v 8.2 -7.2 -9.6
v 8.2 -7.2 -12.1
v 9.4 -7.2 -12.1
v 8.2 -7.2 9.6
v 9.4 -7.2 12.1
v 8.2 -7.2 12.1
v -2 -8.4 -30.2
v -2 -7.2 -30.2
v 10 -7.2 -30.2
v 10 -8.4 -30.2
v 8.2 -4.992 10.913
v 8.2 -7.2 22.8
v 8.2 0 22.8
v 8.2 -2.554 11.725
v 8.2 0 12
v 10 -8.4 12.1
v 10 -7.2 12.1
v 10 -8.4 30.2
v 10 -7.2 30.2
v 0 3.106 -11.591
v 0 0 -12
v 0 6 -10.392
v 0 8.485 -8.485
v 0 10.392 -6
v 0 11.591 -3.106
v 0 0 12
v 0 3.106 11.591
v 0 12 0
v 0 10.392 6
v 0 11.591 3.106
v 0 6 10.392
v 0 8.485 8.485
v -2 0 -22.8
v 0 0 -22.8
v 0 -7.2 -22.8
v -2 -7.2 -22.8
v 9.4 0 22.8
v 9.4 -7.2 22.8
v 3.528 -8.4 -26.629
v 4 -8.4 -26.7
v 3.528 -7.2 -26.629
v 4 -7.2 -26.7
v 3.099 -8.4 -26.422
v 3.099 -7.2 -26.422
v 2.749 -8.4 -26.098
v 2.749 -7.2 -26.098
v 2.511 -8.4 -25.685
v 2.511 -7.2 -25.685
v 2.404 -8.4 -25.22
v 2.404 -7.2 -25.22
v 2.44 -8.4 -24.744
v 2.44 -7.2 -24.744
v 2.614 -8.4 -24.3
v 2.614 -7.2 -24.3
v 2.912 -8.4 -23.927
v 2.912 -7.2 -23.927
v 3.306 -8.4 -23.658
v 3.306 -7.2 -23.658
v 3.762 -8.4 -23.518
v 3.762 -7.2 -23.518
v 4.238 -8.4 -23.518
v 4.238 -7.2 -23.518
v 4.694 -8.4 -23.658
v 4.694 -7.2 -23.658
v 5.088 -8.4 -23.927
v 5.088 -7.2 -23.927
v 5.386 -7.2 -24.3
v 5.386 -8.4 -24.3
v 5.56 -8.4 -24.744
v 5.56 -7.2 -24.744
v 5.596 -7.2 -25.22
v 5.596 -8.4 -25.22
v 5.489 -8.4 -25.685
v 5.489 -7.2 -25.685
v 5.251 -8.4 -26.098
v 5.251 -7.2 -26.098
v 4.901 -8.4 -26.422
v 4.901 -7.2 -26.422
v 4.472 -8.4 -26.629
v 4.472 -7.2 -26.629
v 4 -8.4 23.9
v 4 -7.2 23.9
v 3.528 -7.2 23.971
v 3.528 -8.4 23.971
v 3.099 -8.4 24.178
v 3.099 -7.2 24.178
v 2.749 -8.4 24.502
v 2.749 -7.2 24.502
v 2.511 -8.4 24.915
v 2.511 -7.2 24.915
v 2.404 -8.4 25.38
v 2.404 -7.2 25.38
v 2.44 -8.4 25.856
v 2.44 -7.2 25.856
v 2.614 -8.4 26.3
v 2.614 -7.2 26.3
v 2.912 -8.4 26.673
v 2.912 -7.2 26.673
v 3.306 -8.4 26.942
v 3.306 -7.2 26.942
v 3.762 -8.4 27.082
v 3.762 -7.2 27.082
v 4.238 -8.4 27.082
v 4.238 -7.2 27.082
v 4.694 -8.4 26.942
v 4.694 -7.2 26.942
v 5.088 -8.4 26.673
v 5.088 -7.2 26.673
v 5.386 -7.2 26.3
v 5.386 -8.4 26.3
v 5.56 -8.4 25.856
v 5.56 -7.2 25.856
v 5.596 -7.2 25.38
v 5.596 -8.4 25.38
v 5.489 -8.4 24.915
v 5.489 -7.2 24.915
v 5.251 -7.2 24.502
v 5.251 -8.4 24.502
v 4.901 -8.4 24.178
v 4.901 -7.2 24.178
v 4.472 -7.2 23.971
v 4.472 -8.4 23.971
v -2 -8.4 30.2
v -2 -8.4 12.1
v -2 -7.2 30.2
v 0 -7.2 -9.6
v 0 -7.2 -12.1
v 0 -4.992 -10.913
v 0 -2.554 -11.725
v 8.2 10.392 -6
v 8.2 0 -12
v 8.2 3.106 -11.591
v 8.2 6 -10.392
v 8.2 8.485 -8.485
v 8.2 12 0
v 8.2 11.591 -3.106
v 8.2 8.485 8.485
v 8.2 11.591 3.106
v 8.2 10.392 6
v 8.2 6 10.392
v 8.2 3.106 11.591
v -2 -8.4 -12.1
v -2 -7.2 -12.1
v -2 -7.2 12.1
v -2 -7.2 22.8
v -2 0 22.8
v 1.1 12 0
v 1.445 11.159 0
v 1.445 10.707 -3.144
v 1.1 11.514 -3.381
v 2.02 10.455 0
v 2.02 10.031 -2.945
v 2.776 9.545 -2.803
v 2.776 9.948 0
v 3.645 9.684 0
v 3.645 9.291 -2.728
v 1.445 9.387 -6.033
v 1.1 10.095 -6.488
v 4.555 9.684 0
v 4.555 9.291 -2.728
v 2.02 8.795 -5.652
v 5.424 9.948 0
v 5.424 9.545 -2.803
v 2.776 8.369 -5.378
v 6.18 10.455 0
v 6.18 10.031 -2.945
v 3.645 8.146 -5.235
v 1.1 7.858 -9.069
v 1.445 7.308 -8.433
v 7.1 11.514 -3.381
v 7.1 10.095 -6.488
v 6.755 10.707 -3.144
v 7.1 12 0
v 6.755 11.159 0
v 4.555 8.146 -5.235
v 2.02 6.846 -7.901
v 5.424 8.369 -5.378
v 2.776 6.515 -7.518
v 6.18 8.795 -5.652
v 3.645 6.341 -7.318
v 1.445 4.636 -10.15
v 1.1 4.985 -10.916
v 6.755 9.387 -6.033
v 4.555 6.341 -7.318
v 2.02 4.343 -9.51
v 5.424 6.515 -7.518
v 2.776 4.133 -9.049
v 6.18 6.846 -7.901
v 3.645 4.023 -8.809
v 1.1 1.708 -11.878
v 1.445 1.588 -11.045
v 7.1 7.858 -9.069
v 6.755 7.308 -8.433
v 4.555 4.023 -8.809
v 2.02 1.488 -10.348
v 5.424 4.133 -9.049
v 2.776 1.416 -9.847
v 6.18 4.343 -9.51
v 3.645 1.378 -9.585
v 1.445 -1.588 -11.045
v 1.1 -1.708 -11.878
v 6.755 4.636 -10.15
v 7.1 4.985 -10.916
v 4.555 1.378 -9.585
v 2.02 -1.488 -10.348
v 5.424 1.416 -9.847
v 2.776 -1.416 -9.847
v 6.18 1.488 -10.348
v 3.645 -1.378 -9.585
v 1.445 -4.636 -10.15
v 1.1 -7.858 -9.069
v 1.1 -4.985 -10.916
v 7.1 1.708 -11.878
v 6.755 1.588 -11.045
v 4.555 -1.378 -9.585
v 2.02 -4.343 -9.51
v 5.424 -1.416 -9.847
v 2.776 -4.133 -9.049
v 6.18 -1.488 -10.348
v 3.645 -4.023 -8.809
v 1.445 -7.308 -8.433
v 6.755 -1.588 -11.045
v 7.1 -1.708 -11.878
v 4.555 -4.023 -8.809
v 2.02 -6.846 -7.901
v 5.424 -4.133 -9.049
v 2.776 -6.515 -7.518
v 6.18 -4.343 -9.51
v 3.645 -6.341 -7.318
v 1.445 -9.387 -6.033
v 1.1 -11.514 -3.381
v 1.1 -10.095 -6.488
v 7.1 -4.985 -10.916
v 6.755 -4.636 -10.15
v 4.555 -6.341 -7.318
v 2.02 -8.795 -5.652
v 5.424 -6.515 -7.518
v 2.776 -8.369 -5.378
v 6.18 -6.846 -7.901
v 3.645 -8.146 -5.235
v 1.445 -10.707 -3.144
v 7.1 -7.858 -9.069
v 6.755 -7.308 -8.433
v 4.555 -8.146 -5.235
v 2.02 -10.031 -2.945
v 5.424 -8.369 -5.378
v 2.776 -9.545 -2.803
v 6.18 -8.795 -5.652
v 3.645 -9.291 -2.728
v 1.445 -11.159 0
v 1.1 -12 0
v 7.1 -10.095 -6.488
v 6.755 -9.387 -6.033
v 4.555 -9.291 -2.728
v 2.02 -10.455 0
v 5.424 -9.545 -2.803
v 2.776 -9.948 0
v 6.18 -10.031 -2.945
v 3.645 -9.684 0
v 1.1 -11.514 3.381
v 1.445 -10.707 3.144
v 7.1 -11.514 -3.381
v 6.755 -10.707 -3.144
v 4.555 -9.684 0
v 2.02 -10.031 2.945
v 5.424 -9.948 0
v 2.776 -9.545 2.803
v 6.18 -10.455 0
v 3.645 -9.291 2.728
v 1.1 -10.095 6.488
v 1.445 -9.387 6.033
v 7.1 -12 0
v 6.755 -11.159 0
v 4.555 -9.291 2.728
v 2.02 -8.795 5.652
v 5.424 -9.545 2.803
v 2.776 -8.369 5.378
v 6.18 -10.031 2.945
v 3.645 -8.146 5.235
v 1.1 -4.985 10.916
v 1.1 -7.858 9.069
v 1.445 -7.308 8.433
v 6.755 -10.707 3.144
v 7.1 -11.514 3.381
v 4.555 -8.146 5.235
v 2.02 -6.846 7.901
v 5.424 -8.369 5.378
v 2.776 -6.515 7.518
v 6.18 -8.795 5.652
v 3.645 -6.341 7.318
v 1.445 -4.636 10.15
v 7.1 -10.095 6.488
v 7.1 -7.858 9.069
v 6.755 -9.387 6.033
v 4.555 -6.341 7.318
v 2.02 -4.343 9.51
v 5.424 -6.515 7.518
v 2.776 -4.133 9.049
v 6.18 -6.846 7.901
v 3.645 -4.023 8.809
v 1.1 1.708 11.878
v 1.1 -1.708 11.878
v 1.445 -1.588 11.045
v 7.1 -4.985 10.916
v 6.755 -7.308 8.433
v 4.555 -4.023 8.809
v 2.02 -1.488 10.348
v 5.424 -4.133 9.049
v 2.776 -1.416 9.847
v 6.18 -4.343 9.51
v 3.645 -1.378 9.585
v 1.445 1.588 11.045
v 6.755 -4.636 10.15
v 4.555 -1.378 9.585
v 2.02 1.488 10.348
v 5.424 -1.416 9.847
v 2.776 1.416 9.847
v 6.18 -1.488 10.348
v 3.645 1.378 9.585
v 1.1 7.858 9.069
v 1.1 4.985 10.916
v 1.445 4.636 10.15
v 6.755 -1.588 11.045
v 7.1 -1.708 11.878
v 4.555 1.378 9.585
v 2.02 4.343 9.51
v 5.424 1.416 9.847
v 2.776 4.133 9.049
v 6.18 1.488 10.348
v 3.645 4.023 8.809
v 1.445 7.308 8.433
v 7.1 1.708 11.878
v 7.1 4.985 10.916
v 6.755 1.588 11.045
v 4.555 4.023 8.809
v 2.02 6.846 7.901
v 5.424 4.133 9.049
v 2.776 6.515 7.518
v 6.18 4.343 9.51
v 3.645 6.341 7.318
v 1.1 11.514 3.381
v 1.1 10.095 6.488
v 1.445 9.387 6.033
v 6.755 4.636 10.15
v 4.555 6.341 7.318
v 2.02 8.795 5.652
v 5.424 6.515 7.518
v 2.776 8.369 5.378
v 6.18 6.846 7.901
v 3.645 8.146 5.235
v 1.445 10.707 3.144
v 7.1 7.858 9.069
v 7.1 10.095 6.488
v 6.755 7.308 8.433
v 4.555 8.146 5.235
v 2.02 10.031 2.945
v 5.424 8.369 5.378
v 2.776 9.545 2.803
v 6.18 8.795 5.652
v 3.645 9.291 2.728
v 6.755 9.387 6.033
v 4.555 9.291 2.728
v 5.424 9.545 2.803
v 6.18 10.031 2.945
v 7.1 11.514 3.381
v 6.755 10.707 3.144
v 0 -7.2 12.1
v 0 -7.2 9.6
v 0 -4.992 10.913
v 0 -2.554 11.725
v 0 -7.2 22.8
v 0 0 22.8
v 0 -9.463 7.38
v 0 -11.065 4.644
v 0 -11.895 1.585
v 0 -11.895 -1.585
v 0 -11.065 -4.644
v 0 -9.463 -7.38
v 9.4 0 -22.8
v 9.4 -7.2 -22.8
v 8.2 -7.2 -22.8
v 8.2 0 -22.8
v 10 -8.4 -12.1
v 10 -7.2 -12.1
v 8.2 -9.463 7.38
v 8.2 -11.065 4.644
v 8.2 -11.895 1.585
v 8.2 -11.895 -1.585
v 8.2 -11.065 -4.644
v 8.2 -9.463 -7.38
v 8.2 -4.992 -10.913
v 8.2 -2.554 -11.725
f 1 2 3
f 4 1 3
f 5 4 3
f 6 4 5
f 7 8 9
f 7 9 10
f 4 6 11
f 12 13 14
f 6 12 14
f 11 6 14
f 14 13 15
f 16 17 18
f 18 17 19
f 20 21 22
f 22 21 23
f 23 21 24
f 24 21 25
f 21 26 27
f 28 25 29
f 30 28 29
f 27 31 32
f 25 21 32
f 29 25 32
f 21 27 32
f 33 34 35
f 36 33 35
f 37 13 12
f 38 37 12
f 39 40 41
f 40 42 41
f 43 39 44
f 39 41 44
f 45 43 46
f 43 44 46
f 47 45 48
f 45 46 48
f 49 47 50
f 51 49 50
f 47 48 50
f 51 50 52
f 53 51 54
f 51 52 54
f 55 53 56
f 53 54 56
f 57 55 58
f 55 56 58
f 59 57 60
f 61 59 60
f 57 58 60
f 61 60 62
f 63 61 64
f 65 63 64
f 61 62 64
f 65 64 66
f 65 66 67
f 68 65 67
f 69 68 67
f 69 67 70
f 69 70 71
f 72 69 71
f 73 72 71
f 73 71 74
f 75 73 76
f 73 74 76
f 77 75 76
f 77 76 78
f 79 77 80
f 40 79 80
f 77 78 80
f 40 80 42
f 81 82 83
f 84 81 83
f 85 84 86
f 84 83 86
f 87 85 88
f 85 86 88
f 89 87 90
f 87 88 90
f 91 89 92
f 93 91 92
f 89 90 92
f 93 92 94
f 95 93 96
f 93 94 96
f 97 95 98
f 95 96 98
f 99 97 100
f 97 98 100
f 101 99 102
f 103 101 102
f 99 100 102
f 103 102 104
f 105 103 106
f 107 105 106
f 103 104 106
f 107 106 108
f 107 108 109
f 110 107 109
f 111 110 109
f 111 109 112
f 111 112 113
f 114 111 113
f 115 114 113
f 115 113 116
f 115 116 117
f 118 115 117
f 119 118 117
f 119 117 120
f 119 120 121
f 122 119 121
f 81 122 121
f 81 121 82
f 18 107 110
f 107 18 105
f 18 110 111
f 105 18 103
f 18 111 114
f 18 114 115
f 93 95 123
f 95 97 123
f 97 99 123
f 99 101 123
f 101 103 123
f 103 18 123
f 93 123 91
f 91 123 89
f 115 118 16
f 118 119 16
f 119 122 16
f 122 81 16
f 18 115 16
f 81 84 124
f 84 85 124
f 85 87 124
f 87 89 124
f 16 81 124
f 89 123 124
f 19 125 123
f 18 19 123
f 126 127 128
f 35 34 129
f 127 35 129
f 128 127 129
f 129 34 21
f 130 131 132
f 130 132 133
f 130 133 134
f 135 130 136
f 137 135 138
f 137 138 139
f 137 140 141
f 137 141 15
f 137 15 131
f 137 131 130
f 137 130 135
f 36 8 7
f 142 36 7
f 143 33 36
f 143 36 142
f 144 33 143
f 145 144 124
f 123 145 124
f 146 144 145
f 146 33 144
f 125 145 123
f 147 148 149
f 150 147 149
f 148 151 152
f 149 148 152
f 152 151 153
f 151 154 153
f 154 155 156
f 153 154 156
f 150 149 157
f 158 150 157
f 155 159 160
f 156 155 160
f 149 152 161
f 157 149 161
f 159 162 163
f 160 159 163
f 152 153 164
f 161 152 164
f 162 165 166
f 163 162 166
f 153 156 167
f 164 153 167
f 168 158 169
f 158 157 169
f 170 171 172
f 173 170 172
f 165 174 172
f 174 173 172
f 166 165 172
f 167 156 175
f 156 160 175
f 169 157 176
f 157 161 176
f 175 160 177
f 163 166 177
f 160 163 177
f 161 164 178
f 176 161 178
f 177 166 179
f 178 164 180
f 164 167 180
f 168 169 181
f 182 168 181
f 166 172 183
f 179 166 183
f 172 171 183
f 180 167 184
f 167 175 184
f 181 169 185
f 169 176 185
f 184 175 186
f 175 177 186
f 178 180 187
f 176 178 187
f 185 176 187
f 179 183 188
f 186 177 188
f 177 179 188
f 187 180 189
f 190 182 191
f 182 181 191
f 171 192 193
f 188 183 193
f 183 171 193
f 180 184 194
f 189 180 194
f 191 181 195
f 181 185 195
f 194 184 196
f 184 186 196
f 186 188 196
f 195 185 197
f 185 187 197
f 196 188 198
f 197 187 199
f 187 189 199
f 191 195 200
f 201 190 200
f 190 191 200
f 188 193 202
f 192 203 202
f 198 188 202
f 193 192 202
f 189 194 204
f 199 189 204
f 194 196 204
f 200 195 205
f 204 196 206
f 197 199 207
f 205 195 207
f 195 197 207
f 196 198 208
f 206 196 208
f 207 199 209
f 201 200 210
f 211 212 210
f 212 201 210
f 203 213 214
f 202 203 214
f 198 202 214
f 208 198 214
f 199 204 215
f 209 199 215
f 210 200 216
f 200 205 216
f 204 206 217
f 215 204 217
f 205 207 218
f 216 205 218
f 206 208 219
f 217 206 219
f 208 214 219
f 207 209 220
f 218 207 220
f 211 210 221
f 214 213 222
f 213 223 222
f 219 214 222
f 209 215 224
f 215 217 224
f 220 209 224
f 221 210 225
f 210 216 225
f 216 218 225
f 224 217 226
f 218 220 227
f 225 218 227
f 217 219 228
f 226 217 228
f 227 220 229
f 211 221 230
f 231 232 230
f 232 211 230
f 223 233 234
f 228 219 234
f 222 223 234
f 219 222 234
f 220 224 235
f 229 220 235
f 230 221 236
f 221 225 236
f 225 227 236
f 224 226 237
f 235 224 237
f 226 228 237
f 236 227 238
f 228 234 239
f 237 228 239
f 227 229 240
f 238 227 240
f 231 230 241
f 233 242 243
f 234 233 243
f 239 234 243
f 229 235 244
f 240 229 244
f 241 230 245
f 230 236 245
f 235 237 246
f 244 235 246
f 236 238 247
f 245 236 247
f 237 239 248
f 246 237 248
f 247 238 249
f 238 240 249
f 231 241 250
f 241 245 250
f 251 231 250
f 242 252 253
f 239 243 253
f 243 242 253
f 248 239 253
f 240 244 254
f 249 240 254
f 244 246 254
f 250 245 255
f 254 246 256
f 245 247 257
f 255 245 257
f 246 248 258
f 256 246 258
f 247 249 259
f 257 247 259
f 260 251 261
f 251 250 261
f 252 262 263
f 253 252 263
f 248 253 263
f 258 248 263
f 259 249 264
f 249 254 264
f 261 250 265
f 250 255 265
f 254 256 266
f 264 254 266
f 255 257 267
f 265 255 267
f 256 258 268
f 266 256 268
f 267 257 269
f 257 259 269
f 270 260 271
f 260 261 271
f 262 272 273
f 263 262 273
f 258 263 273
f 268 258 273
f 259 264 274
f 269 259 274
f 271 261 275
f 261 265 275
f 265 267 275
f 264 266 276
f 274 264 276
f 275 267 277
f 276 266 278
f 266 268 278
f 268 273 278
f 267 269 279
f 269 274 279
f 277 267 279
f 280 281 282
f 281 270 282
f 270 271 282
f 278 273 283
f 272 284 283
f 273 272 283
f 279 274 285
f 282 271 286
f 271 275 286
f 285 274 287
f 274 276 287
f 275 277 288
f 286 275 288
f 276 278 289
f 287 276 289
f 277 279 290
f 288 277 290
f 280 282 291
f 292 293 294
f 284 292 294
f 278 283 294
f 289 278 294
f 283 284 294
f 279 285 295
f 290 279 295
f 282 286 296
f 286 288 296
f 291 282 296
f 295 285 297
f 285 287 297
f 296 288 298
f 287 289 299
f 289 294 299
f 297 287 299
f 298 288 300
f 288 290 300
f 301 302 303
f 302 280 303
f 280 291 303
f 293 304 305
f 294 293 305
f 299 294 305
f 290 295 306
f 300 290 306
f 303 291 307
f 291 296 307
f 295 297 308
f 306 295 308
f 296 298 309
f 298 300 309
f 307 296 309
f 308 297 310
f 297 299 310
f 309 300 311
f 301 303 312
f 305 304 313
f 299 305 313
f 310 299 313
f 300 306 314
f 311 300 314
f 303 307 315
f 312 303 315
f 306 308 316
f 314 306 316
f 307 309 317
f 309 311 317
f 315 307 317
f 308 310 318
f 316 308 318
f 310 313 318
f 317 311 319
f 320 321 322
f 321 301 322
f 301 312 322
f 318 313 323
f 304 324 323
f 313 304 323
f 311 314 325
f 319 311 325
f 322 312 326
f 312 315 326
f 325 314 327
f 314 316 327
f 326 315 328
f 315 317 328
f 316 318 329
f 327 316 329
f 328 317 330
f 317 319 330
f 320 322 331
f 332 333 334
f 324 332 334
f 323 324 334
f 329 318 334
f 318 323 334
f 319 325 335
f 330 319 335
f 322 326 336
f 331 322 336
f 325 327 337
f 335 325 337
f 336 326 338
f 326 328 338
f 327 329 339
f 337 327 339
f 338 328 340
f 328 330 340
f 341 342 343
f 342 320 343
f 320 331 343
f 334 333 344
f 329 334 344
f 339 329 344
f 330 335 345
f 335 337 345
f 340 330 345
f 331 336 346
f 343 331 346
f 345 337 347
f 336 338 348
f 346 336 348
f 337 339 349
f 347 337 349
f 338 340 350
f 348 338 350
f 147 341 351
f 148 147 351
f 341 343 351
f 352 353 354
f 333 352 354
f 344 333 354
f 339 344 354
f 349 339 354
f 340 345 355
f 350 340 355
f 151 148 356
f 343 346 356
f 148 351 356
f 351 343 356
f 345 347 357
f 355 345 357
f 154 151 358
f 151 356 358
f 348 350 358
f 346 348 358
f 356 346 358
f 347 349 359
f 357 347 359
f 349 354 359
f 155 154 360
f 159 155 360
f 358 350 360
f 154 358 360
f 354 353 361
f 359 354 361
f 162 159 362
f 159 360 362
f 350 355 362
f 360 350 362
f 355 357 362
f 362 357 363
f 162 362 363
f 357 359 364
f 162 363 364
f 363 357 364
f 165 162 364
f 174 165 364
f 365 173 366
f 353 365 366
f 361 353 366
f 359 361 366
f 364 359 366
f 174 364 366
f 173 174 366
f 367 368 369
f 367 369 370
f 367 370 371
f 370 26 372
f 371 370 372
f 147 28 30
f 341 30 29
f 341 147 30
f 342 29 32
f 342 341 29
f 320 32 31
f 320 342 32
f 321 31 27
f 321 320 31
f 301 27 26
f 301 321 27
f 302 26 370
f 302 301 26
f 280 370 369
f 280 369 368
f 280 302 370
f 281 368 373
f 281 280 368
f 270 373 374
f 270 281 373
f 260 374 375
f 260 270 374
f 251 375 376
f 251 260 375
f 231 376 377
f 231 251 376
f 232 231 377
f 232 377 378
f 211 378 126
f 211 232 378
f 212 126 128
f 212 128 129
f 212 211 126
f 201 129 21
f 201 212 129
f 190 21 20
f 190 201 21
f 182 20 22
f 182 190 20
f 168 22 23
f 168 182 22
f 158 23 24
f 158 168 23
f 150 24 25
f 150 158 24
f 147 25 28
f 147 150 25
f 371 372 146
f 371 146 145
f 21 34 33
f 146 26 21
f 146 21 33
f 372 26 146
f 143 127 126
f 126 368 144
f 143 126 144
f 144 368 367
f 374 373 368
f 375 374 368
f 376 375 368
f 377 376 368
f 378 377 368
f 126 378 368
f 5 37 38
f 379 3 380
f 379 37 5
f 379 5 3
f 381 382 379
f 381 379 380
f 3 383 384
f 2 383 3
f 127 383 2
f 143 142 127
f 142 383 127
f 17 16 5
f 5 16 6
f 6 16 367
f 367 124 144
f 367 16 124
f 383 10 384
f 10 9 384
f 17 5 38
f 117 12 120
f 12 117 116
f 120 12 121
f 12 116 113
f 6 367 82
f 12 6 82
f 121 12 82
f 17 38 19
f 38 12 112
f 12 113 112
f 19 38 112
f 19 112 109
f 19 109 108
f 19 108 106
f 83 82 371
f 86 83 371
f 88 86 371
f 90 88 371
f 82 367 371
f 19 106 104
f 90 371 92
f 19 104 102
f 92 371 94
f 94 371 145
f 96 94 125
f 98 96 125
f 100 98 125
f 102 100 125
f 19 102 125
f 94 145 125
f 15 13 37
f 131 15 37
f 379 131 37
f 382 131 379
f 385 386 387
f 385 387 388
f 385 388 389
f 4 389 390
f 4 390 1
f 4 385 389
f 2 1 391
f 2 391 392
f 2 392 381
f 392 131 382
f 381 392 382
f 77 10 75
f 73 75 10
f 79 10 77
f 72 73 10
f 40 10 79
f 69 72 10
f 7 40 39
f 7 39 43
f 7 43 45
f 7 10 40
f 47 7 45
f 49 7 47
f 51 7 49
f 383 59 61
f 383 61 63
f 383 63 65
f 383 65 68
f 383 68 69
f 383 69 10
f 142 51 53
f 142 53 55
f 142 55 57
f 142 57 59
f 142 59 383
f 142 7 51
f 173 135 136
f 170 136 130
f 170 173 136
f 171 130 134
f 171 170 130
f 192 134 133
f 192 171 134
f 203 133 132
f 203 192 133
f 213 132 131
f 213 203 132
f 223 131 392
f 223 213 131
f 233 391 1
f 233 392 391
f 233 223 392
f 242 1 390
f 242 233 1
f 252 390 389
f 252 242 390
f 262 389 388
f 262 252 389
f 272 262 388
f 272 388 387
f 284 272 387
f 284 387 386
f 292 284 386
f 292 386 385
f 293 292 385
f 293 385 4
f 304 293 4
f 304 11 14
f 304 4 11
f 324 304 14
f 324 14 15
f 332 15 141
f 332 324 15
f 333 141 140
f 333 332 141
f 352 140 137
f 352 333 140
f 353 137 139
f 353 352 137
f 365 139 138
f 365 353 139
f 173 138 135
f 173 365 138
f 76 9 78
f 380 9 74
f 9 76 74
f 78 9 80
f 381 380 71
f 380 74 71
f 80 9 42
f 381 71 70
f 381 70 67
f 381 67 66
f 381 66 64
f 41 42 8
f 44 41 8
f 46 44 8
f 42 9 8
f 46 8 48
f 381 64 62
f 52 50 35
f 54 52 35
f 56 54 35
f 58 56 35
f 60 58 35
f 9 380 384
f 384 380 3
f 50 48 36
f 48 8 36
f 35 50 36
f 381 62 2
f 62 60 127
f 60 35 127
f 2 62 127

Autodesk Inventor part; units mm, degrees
ref_plane "YZ Plane" through (0, 0, 0) normal (1, 0, 0) x (0, 1, 0)
ref_plane "XZ Plane" through (0, 0, 0) normal (0, 1, 0) x (-1, 0, 0)
ref_plane "XY Plane" through (0, 0, 0) normal (0, 0, 1) x (1, 0, 0)
sketch "スケッチ1" plane through (0, 0, 0) normal (0, 0, 1) x (1, 0, 0)
  line L0 (0, 0) -> (8.2, 0)
  line L1 (8.2, 0) -> (4.1, 0)
  line L2 (0, 0) -> (0, 12)
  line L3 (8.2, 0) -> (8.2, 12)
  line L4 (4.1, 0) -> (4.1, 9.65)
  line L5 (0, 12) -> (1.1, 12)
  line L6 (8.2, 12) -> (7.1, 12)
  arc A0 (1.1, 12) -> (7.1, 12) centre (4.1, 12.7399) ccw
  dimension "d0" = 8.2
  dimension "d1" = 12
  dimension "d2" = 12
  dimension "d3" = 9.65
  dimension "d4" = 1.1
  dimension "d5" = 1.1
revolve "回転1" add sketch "スケッチ1" angle 360 about axis through (0, 0, 0) along (1, 0, 0)
sketch "スケッチ2" plane through (8.2, 0, 0) normal (1, 0, 0) x (0, 0, -1)
  circle A0 centre (0, 0) radius 12 projected
  line L0 (0, 0) -> (22.8, 0)
  line L1 (0, 0) -> (0, -7.2)
  line L2 (0, 0) -> (22.8, 0)
  line L3 (22.8, 0) -> (22.8, -7.2)
  line L4 (22.8, -7.2) -> (0, -7.2)
  line L5 (0, -7.2) -> (0, 0)
  line L6 (0, 0) -> (-22.8, 0)
  line L7 (-22.8, 0) -> (-22.8, -7.2)
  line L8 (-22.8, -7.2) -> (0, -7.2)
  dimension "d7" = 22.8
  dimension "d8" = 7.2
  dimension "d17" = 0
extrude "押し出し1" add sketch "スケッチ2" along normal blind 1.2 contours L0 L3 L4 A0 | A0 L4 L1 L0 | L6 L1 L8 A0 | A0 L8 L7 L6
sketch "スケッチ3" plane through (0, 0, 0) normal (-1, 0, 0) x (0, 0, 1)
  circle A0 centre (0, 0) radius 12 projected
  line L0 (0, 0) -> (0, -7.2)
  line L1 (0, -7.2) -> (22.8, -7.2)
  line L2 (0, 0) -> (22.8, 0)
  line L3 (22.8, 0) -> (22.8, -7.2)
  line L4 (22.8, -7.2) -> (0, -7.2)
  line L5 (0, -7.2) -> (0, 0)
  line L6 (0, 0) -> (-22.8, 0)
  line L7 (-22.8, 0) -> (-22.8, -7.2)
  line L8 (-22.8, -7.2) -> (0, -7.2)
  dimension "d11" = 7.2
  dimension "d12" = 22.8
extrude "押し出し2" add sketch "スケッチ3" along normal blind 2 contours L2 L3 L1 A0 | A0 L1 L0 L2 | L6 L0 L8 A0 | A0 L8 L7 L6
sketch "スケッチ4" plane through (-2, 0, 0) normal (-1, 0, 0) x (0, 0, 1)
  line L0 (-22.8, -7.2) -> (22.8, -7.2) projected
  line L1 (0, -7.2) -> (12.1, -7.2)
  line L2 (12.1, -7.2) -> (30.2, -7.2)
  line L3 (12.1, -7.2) -> (30.2, -7.2)
  line L4 (30.2, -7.2) -> (30.2, -8.4)
  line L5 (30.2, -8.4) -> (12.1, -8.4)
  line L6 (12.1, -8.4) -> (12.1, -7.2)
  line L7 (0, 0) -> (0, -1.8874)
  line L8 (-12.1, -7.2) -> (-30.2, -7.2)
  line L9 (-30.2, -7.2) -> (-30.2, -8.4)
  line L10 (-30.2, -8.4) -> (-12.1, -8.4)
  line L11 (-12.1, -8.4) -> (-12.1, -7.2)
  dimension "d15" = 12.1
  dimension "d16" = 18.1
  dimension "d18" = 1.2
extrude "押し出し3" add sketch "スケッチ4" against normal blind 12
sketch "スケッチ5" plane through (-2, -8.4, 12.1) normal (0, -1, 0) x (1, 0, 0)
  line L0 (0, 18.1) -> (12, 18.1) projected
  line L1 (6, 18.1) -> (6, 13.4)
  line L2 (6, 13.4) -> (6, -37.2)
  circle A0 centre (6, -37.2) radius 1.6
  circle A1 centre (6, 13.4) radius 1.6
  point P0 (2, -12.1)
  dimension "d21" = 4.7
  dimension "d22" = 50.6
  dimension "d23" = 3.2
  dimension "d24" = 3.2
hole "穴1" at (4, -8.4, 25.5) at (4, -8.4, -25.1) direction (0, 1, 0) diameter 3.2 depth 8 tip angle 118
properties part number "知能ロボコンショウレックス戸草"
